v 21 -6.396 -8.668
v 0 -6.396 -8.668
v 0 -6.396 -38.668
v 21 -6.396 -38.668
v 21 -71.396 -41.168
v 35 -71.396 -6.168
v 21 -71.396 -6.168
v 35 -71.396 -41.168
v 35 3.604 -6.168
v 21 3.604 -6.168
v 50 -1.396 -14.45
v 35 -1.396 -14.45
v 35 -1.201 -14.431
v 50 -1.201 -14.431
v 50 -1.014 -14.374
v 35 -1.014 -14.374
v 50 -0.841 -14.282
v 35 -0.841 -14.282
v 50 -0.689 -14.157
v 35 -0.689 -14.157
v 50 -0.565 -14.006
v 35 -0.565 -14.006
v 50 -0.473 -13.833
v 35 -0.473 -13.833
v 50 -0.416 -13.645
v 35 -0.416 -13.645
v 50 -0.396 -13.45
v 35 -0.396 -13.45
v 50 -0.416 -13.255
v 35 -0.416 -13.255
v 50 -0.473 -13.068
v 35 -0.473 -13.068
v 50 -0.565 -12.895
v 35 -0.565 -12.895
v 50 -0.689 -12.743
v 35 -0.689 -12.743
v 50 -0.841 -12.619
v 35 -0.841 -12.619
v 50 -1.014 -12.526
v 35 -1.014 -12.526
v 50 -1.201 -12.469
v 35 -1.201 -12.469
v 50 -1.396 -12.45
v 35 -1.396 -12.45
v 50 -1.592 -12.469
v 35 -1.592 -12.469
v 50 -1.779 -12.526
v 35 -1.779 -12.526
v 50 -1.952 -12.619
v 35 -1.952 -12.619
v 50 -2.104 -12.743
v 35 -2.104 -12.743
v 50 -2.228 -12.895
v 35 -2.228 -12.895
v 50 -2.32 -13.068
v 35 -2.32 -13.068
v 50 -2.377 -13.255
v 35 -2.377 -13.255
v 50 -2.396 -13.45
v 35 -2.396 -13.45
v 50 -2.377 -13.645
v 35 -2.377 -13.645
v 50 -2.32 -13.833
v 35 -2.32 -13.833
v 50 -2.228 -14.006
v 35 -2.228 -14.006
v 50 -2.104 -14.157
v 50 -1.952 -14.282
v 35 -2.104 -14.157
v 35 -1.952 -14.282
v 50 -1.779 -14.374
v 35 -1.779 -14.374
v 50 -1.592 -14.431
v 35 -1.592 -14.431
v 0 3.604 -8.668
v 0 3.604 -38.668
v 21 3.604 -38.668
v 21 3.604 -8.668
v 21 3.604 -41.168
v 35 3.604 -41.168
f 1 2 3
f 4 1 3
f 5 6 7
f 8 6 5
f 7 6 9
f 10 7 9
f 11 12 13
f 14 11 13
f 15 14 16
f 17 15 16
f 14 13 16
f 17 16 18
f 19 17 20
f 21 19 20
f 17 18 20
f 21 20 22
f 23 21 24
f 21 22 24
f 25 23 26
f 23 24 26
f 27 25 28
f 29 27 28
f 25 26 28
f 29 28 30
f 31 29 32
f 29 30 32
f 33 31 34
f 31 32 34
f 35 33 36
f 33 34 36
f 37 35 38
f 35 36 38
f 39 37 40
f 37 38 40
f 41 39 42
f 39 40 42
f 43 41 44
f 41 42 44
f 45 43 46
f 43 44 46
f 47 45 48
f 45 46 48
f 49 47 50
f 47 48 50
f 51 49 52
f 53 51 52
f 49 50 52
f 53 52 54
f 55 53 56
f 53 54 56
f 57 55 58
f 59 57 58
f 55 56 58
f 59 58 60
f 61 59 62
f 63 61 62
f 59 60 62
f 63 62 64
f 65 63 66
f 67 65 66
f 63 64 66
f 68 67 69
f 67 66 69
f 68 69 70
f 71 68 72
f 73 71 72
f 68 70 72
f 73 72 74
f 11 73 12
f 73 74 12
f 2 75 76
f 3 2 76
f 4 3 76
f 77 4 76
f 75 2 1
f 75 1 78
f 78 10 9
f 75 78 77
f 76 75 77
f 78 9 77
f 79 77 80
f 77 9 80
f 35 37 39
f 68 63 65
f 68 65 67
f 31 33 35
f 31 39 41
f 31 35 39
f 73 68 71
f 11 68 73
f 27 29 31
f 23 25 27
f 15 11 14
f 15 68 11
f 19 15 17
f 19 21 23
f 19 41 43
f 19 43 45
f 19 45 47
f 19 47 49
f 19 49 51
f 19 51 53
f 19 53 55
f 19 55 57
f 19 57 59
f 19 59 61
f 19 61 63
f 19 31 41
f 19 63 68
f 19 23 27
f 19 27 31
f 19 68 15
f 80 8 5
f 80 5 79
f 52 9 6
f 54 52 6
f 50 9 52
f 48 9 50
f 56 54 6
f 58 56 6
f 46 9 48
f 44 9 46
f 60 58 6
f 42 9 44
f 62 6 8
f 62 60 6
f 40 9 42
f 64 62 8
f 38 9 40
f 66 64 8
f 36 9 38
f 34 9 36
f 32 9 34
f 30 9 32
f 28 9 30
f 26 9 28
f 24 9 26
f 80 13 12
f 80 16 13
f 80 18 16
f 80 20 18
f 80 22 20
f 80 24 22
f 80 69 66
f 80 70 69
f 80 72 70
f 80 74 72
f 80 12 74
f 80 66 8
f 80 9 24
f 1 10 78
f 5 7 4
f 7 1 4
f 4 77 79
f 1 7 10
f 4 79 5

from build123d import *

# Parameters (mm, degrees)
ESQUISSE1_W        = 30
ESQUISSE1_H        = 10
BOSS_EXTRU_1_DEPTH = 35
ESQUISSE3_R        = 1
BOSS_EXTRU_2_DEPTH = 15
ESQUISSE4_W        = 35
ESQUISSE4_H        = 75
BOSS_EXTRU_3_DEPTH = 14


with BuildPart() as part:
    # Esquisse1 → Boss.-Extru.1 (new body)
    with BuildSketch(Plane(origin=(0, 0, 0), x_dir=(0, 0, -1), z_dir=(1, 0, 0))):
        with Locations((23.668323467, -1.396462247)):
            Rectangle(ESQUISSE1_W, ESQUISSE1_H)
    extrude(amount=BOSS_EXTRU_1_DEPTH)

    # Esquisse3 → Boss.-Extru.2 (add)
    with BuildSketch(Plane(origin=(35, 0, 0), x_dir=(0, 0, -1), z_dir=(1, 0, 0))):
        with Locations((13.450280626, -1.396462247)):
            Circle(ESQUISSE3_R)
    extrude(amount=BOSS_EXTRU_2_DEPTH)

    # Esquisse4 → Boss.-Extru.3 (add)
    with BuildSketch(Plane(origin=(35, 0, 0), x_dir=(0, 0, -1), z_dir=(1, 0, 0))):
        with Locations((23.668323467, -33.896462247)):
            Rectangle(ESQUISSE4_W, ESQUISSE4_H)
    extrude(amount=-BOSS_EXTRU_3_DEPTH)


solid = part.part
